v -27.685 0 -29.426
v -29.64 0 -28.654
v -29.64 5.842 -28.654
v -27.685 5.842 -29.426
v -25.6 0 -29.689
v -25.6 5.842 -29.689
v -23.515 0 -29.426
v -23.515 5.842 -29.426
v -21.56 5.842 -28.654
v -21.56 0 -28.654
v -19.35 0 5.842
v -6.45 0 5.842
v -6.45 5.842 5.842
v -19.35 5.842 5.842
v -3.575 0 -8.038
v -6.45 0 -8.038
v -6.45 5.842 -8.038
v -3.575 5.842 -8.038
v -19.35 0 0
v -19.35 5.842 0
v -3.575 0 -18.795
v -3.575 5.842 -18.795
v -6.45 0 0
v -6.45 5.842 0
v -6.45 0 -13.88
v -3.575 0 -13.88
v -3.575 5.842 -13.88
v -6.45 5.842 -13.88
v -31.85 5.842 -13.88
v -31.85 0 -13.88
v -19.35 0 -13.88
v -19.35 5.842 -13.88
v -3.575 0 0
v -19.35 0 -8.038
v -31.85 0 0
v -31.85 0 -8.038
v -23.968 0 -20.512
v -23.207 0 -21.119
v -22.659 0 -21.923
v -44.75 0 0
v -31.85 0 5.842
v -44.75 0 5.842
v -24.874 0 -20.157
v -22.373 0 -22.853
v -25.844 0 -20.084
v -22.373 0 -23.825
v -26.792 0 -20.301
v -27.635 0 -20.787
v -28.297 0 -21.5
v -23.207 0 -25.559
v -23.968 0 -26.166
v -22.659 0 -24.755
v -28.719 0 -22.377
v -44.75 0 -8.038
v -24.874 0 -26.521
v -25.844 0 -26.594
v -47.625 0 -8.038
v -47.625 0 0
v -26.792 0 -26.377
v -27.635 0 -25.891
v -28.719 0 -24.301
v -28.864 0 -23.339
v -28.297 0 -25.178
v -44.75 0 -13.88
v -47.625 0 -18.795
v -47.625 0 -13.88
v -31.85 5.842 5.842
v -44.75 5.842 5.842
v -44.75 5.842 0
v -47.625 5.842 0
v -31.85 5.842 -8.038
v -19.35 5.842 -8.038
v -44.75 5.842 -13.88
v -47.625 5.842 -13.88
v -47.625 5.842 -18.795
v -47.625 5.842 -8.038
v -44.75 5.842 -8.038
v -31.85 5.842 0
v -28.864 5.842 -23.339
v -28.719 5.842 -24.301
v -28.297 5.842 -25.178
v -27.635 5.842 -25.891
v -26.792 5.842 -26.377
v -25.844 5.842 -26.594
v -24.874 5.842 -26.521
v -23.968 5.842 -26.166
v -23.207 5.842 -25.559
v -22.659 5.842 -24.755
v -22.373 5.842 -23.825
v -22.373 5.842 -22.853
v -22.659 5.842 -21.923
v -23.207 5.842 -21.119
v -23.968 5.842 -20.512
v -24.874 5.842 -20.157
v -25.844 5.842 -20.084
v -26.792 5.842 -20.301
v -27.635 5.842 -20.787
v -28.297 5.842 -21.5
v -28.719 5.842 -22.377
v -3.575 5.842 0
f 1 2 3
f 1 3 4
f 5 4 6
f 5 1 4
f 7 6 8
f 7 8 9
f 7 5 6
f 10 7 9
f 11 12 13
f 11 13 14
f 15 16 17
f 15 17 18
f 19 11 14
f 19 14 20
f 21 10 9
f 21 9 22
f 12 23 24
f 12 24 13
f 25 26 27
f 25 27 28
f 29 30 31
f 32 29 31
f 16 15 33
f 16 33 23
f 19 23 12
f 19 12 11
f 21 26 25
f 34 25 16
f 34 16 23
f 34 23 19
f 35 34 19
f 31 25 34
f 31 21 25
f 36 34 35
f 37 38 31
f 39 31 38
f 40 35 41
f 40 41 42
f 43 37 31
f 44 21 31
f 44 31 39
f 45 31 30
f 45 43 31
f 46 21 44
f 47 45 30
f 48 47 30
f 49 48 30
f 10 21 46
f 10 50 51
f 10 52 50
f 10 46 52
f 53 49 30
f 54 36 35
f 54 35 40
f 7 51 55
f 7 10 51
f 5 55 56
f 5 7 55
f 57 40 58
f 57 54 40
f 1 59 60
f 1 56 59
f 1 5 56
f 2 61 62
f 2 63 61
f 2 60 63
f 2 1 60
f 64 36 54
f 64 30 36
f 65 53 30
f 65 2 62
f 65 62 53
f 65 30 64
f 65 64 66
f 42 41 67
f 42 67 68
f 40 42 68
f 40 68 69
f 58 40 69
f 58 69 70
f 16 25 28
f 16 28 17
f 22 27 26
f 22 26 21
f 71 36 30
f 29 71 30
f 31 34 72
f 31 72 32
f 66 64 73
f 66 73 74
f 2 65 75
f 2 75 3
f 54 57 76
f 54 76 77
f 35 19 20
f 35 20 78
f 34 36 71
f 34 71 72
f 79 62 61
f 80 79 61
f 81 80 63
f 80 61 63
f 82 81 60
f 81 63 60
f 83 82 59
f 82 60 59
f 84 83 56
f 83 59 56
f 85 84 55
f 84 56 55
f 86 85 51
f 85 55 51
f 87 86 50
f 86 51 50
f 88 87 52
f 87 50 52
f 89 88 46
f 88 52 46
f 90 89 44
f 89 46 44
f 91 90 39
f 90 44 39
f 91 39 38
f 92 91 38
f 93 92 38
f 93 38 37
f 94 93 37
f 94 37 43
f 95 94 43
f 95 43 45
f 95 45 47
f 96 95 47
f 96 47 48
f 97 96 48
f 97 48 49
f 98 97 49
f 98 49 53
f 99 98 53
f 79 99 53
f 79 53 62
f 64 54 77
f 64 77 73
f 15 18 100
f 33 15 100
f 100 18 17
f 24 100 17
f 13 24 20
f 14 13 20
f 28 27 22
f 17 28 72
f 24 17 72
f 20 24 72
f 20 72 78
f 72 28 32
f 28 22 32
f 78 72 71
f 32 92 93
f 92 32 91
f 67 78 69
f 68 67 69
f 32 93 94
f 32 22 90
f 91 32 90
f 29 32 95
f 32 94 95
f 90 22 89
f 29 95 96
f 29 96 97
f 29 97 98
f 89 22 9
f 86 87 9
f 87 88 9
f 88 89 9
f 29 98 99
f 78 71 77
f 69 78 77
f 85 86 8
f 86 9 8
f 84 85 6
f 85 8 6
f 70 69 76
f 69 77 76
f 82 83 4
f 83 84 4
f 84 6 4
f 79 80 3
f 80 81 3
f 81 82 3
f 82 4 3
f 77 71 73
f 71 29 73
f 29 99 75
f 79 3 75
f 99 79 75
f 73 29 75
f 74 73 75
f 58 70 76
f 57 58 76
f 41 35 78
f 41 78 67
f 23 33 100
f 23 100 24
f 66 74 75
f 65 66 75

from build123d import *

# Parameters (mm, degrees)
SKETCH1_W                = 12.5
SKETCH1_H                = 5.842
BOSS_EXTRUDE2_DEPTH      = 5.842
F_0_257_DIAMETER_HOLE1_D = 6.5278
SKETCH4_W                = 3.175
SKETCH4_H                = 8.0375
SKETCH4_H_2              = 6.35
CUT_EXTRUDE1_DEPTH       = 60.128735202


with BuildPart() as part:
    # Sketch1 → Boss-Extrude2 (new body)
    with BuildSketch(Plane(origin=(0, 0, 0), x_dir=(1, 0, 0), z_dir=(0, 1, 0))):
        with BuildLine():
            Line((0, 0), (-6.45, 0))
            Line((-6.45, 0), (-6.45, -5.842))
            Line((-6.45, -5.842), (-19.35, -5.842))
            Line((-19.35, -5.842), (-19.35, 0))
            Line((-19.35, 0), (-31.85, 0))
            Line((-31.85, 0), (-31.85, -5.842))
            Line((-31.85, -5.842), (-44.75, -5.842))
            Line((-44.75, -5.842), (-44.75, 0))
            Line((-44.75, 0), (-50.8, 0))
            Line((-50.8, 0), (-50.8, 8.0375))
            Line((-50.8, 8.0375), (-44.75, 8.0375))
            Line((-44.75, 8.0375), (-44.75, 13.8795))
            Line((-44.75, 13.8795), (-50.8, 13.8795))
            Line((-50.8, 13.8795), (-50.8, 17.0545))
            Line((-50.8, 17.0545), (-29.639726031, 28.654387599))
            ThreePointArc((-29.639726031, 28.654387599), (-25.6, 29.689027646), (-21.560273969, 28.654387599))
            Line((-21.560273969, 28.654387599), (-0.4, 17.0545))
            Line((-0.4, 17.0545), (-0.4, 13.8795))
            Line((-0.4, 13.8795), (-6.45, 13.8795))
            Line((-6.45, 13.8795), (-6.45, 8.0375))
            Line((-6.45, 8.0375), (0, 8.0375))
            Line((0, 8.0375), (0, 0))
        make_face()
        with Locations((-25.6, 10.9585)):
            Rectangle(SKETCH1_W, SKETCH1_H, mode=Mode.SUBTRACT)
    extrude(amount=BOSS_EXTRUDE2_DEPTH)

    # F (0.257) Diameter Hole1 (through all)
    with Locations(Plane(origin=(0, 5.842, 0), x_dir=(1, 0, 0), z_dir=(0, 1, 0))):
        with Locations((-25.6, 23.339027646)):
            Hole(F_0_257_DIAMETER_HOLE1_D / 2)

    # Sketch4 → Cut-Extrude1 (cut, through all)
    with BuildSketch(Plane(origin=(0, 5.842, 0), x_dir=(1, 0, 0), z_dir=(0, 1, 0))):
        with Locations((-49.2125, 4.01875)):
            Rectangle(SKETCH4_W, SKETCH4_H)
        Polygon((-3.575, 9.495445591), (-3.575, 0), (-0.4, 0), (0, 0), (0, 9.495445591), (-0.4, 9.495445591), align=None)
        with Locations((-49.2125, 17.0545)):
            Rectangle(SKETCH4_W, SKETCH4_H_2)
        with Locations((-1.9875, 16.9545)):
            Rectangle(SKETCH4_W, SKETCH4_H_2)
    extrude(amount=-CUT_EXTRUDE1_DEPTH, mode=Mode.SUBTRACT)


solid = part.part
